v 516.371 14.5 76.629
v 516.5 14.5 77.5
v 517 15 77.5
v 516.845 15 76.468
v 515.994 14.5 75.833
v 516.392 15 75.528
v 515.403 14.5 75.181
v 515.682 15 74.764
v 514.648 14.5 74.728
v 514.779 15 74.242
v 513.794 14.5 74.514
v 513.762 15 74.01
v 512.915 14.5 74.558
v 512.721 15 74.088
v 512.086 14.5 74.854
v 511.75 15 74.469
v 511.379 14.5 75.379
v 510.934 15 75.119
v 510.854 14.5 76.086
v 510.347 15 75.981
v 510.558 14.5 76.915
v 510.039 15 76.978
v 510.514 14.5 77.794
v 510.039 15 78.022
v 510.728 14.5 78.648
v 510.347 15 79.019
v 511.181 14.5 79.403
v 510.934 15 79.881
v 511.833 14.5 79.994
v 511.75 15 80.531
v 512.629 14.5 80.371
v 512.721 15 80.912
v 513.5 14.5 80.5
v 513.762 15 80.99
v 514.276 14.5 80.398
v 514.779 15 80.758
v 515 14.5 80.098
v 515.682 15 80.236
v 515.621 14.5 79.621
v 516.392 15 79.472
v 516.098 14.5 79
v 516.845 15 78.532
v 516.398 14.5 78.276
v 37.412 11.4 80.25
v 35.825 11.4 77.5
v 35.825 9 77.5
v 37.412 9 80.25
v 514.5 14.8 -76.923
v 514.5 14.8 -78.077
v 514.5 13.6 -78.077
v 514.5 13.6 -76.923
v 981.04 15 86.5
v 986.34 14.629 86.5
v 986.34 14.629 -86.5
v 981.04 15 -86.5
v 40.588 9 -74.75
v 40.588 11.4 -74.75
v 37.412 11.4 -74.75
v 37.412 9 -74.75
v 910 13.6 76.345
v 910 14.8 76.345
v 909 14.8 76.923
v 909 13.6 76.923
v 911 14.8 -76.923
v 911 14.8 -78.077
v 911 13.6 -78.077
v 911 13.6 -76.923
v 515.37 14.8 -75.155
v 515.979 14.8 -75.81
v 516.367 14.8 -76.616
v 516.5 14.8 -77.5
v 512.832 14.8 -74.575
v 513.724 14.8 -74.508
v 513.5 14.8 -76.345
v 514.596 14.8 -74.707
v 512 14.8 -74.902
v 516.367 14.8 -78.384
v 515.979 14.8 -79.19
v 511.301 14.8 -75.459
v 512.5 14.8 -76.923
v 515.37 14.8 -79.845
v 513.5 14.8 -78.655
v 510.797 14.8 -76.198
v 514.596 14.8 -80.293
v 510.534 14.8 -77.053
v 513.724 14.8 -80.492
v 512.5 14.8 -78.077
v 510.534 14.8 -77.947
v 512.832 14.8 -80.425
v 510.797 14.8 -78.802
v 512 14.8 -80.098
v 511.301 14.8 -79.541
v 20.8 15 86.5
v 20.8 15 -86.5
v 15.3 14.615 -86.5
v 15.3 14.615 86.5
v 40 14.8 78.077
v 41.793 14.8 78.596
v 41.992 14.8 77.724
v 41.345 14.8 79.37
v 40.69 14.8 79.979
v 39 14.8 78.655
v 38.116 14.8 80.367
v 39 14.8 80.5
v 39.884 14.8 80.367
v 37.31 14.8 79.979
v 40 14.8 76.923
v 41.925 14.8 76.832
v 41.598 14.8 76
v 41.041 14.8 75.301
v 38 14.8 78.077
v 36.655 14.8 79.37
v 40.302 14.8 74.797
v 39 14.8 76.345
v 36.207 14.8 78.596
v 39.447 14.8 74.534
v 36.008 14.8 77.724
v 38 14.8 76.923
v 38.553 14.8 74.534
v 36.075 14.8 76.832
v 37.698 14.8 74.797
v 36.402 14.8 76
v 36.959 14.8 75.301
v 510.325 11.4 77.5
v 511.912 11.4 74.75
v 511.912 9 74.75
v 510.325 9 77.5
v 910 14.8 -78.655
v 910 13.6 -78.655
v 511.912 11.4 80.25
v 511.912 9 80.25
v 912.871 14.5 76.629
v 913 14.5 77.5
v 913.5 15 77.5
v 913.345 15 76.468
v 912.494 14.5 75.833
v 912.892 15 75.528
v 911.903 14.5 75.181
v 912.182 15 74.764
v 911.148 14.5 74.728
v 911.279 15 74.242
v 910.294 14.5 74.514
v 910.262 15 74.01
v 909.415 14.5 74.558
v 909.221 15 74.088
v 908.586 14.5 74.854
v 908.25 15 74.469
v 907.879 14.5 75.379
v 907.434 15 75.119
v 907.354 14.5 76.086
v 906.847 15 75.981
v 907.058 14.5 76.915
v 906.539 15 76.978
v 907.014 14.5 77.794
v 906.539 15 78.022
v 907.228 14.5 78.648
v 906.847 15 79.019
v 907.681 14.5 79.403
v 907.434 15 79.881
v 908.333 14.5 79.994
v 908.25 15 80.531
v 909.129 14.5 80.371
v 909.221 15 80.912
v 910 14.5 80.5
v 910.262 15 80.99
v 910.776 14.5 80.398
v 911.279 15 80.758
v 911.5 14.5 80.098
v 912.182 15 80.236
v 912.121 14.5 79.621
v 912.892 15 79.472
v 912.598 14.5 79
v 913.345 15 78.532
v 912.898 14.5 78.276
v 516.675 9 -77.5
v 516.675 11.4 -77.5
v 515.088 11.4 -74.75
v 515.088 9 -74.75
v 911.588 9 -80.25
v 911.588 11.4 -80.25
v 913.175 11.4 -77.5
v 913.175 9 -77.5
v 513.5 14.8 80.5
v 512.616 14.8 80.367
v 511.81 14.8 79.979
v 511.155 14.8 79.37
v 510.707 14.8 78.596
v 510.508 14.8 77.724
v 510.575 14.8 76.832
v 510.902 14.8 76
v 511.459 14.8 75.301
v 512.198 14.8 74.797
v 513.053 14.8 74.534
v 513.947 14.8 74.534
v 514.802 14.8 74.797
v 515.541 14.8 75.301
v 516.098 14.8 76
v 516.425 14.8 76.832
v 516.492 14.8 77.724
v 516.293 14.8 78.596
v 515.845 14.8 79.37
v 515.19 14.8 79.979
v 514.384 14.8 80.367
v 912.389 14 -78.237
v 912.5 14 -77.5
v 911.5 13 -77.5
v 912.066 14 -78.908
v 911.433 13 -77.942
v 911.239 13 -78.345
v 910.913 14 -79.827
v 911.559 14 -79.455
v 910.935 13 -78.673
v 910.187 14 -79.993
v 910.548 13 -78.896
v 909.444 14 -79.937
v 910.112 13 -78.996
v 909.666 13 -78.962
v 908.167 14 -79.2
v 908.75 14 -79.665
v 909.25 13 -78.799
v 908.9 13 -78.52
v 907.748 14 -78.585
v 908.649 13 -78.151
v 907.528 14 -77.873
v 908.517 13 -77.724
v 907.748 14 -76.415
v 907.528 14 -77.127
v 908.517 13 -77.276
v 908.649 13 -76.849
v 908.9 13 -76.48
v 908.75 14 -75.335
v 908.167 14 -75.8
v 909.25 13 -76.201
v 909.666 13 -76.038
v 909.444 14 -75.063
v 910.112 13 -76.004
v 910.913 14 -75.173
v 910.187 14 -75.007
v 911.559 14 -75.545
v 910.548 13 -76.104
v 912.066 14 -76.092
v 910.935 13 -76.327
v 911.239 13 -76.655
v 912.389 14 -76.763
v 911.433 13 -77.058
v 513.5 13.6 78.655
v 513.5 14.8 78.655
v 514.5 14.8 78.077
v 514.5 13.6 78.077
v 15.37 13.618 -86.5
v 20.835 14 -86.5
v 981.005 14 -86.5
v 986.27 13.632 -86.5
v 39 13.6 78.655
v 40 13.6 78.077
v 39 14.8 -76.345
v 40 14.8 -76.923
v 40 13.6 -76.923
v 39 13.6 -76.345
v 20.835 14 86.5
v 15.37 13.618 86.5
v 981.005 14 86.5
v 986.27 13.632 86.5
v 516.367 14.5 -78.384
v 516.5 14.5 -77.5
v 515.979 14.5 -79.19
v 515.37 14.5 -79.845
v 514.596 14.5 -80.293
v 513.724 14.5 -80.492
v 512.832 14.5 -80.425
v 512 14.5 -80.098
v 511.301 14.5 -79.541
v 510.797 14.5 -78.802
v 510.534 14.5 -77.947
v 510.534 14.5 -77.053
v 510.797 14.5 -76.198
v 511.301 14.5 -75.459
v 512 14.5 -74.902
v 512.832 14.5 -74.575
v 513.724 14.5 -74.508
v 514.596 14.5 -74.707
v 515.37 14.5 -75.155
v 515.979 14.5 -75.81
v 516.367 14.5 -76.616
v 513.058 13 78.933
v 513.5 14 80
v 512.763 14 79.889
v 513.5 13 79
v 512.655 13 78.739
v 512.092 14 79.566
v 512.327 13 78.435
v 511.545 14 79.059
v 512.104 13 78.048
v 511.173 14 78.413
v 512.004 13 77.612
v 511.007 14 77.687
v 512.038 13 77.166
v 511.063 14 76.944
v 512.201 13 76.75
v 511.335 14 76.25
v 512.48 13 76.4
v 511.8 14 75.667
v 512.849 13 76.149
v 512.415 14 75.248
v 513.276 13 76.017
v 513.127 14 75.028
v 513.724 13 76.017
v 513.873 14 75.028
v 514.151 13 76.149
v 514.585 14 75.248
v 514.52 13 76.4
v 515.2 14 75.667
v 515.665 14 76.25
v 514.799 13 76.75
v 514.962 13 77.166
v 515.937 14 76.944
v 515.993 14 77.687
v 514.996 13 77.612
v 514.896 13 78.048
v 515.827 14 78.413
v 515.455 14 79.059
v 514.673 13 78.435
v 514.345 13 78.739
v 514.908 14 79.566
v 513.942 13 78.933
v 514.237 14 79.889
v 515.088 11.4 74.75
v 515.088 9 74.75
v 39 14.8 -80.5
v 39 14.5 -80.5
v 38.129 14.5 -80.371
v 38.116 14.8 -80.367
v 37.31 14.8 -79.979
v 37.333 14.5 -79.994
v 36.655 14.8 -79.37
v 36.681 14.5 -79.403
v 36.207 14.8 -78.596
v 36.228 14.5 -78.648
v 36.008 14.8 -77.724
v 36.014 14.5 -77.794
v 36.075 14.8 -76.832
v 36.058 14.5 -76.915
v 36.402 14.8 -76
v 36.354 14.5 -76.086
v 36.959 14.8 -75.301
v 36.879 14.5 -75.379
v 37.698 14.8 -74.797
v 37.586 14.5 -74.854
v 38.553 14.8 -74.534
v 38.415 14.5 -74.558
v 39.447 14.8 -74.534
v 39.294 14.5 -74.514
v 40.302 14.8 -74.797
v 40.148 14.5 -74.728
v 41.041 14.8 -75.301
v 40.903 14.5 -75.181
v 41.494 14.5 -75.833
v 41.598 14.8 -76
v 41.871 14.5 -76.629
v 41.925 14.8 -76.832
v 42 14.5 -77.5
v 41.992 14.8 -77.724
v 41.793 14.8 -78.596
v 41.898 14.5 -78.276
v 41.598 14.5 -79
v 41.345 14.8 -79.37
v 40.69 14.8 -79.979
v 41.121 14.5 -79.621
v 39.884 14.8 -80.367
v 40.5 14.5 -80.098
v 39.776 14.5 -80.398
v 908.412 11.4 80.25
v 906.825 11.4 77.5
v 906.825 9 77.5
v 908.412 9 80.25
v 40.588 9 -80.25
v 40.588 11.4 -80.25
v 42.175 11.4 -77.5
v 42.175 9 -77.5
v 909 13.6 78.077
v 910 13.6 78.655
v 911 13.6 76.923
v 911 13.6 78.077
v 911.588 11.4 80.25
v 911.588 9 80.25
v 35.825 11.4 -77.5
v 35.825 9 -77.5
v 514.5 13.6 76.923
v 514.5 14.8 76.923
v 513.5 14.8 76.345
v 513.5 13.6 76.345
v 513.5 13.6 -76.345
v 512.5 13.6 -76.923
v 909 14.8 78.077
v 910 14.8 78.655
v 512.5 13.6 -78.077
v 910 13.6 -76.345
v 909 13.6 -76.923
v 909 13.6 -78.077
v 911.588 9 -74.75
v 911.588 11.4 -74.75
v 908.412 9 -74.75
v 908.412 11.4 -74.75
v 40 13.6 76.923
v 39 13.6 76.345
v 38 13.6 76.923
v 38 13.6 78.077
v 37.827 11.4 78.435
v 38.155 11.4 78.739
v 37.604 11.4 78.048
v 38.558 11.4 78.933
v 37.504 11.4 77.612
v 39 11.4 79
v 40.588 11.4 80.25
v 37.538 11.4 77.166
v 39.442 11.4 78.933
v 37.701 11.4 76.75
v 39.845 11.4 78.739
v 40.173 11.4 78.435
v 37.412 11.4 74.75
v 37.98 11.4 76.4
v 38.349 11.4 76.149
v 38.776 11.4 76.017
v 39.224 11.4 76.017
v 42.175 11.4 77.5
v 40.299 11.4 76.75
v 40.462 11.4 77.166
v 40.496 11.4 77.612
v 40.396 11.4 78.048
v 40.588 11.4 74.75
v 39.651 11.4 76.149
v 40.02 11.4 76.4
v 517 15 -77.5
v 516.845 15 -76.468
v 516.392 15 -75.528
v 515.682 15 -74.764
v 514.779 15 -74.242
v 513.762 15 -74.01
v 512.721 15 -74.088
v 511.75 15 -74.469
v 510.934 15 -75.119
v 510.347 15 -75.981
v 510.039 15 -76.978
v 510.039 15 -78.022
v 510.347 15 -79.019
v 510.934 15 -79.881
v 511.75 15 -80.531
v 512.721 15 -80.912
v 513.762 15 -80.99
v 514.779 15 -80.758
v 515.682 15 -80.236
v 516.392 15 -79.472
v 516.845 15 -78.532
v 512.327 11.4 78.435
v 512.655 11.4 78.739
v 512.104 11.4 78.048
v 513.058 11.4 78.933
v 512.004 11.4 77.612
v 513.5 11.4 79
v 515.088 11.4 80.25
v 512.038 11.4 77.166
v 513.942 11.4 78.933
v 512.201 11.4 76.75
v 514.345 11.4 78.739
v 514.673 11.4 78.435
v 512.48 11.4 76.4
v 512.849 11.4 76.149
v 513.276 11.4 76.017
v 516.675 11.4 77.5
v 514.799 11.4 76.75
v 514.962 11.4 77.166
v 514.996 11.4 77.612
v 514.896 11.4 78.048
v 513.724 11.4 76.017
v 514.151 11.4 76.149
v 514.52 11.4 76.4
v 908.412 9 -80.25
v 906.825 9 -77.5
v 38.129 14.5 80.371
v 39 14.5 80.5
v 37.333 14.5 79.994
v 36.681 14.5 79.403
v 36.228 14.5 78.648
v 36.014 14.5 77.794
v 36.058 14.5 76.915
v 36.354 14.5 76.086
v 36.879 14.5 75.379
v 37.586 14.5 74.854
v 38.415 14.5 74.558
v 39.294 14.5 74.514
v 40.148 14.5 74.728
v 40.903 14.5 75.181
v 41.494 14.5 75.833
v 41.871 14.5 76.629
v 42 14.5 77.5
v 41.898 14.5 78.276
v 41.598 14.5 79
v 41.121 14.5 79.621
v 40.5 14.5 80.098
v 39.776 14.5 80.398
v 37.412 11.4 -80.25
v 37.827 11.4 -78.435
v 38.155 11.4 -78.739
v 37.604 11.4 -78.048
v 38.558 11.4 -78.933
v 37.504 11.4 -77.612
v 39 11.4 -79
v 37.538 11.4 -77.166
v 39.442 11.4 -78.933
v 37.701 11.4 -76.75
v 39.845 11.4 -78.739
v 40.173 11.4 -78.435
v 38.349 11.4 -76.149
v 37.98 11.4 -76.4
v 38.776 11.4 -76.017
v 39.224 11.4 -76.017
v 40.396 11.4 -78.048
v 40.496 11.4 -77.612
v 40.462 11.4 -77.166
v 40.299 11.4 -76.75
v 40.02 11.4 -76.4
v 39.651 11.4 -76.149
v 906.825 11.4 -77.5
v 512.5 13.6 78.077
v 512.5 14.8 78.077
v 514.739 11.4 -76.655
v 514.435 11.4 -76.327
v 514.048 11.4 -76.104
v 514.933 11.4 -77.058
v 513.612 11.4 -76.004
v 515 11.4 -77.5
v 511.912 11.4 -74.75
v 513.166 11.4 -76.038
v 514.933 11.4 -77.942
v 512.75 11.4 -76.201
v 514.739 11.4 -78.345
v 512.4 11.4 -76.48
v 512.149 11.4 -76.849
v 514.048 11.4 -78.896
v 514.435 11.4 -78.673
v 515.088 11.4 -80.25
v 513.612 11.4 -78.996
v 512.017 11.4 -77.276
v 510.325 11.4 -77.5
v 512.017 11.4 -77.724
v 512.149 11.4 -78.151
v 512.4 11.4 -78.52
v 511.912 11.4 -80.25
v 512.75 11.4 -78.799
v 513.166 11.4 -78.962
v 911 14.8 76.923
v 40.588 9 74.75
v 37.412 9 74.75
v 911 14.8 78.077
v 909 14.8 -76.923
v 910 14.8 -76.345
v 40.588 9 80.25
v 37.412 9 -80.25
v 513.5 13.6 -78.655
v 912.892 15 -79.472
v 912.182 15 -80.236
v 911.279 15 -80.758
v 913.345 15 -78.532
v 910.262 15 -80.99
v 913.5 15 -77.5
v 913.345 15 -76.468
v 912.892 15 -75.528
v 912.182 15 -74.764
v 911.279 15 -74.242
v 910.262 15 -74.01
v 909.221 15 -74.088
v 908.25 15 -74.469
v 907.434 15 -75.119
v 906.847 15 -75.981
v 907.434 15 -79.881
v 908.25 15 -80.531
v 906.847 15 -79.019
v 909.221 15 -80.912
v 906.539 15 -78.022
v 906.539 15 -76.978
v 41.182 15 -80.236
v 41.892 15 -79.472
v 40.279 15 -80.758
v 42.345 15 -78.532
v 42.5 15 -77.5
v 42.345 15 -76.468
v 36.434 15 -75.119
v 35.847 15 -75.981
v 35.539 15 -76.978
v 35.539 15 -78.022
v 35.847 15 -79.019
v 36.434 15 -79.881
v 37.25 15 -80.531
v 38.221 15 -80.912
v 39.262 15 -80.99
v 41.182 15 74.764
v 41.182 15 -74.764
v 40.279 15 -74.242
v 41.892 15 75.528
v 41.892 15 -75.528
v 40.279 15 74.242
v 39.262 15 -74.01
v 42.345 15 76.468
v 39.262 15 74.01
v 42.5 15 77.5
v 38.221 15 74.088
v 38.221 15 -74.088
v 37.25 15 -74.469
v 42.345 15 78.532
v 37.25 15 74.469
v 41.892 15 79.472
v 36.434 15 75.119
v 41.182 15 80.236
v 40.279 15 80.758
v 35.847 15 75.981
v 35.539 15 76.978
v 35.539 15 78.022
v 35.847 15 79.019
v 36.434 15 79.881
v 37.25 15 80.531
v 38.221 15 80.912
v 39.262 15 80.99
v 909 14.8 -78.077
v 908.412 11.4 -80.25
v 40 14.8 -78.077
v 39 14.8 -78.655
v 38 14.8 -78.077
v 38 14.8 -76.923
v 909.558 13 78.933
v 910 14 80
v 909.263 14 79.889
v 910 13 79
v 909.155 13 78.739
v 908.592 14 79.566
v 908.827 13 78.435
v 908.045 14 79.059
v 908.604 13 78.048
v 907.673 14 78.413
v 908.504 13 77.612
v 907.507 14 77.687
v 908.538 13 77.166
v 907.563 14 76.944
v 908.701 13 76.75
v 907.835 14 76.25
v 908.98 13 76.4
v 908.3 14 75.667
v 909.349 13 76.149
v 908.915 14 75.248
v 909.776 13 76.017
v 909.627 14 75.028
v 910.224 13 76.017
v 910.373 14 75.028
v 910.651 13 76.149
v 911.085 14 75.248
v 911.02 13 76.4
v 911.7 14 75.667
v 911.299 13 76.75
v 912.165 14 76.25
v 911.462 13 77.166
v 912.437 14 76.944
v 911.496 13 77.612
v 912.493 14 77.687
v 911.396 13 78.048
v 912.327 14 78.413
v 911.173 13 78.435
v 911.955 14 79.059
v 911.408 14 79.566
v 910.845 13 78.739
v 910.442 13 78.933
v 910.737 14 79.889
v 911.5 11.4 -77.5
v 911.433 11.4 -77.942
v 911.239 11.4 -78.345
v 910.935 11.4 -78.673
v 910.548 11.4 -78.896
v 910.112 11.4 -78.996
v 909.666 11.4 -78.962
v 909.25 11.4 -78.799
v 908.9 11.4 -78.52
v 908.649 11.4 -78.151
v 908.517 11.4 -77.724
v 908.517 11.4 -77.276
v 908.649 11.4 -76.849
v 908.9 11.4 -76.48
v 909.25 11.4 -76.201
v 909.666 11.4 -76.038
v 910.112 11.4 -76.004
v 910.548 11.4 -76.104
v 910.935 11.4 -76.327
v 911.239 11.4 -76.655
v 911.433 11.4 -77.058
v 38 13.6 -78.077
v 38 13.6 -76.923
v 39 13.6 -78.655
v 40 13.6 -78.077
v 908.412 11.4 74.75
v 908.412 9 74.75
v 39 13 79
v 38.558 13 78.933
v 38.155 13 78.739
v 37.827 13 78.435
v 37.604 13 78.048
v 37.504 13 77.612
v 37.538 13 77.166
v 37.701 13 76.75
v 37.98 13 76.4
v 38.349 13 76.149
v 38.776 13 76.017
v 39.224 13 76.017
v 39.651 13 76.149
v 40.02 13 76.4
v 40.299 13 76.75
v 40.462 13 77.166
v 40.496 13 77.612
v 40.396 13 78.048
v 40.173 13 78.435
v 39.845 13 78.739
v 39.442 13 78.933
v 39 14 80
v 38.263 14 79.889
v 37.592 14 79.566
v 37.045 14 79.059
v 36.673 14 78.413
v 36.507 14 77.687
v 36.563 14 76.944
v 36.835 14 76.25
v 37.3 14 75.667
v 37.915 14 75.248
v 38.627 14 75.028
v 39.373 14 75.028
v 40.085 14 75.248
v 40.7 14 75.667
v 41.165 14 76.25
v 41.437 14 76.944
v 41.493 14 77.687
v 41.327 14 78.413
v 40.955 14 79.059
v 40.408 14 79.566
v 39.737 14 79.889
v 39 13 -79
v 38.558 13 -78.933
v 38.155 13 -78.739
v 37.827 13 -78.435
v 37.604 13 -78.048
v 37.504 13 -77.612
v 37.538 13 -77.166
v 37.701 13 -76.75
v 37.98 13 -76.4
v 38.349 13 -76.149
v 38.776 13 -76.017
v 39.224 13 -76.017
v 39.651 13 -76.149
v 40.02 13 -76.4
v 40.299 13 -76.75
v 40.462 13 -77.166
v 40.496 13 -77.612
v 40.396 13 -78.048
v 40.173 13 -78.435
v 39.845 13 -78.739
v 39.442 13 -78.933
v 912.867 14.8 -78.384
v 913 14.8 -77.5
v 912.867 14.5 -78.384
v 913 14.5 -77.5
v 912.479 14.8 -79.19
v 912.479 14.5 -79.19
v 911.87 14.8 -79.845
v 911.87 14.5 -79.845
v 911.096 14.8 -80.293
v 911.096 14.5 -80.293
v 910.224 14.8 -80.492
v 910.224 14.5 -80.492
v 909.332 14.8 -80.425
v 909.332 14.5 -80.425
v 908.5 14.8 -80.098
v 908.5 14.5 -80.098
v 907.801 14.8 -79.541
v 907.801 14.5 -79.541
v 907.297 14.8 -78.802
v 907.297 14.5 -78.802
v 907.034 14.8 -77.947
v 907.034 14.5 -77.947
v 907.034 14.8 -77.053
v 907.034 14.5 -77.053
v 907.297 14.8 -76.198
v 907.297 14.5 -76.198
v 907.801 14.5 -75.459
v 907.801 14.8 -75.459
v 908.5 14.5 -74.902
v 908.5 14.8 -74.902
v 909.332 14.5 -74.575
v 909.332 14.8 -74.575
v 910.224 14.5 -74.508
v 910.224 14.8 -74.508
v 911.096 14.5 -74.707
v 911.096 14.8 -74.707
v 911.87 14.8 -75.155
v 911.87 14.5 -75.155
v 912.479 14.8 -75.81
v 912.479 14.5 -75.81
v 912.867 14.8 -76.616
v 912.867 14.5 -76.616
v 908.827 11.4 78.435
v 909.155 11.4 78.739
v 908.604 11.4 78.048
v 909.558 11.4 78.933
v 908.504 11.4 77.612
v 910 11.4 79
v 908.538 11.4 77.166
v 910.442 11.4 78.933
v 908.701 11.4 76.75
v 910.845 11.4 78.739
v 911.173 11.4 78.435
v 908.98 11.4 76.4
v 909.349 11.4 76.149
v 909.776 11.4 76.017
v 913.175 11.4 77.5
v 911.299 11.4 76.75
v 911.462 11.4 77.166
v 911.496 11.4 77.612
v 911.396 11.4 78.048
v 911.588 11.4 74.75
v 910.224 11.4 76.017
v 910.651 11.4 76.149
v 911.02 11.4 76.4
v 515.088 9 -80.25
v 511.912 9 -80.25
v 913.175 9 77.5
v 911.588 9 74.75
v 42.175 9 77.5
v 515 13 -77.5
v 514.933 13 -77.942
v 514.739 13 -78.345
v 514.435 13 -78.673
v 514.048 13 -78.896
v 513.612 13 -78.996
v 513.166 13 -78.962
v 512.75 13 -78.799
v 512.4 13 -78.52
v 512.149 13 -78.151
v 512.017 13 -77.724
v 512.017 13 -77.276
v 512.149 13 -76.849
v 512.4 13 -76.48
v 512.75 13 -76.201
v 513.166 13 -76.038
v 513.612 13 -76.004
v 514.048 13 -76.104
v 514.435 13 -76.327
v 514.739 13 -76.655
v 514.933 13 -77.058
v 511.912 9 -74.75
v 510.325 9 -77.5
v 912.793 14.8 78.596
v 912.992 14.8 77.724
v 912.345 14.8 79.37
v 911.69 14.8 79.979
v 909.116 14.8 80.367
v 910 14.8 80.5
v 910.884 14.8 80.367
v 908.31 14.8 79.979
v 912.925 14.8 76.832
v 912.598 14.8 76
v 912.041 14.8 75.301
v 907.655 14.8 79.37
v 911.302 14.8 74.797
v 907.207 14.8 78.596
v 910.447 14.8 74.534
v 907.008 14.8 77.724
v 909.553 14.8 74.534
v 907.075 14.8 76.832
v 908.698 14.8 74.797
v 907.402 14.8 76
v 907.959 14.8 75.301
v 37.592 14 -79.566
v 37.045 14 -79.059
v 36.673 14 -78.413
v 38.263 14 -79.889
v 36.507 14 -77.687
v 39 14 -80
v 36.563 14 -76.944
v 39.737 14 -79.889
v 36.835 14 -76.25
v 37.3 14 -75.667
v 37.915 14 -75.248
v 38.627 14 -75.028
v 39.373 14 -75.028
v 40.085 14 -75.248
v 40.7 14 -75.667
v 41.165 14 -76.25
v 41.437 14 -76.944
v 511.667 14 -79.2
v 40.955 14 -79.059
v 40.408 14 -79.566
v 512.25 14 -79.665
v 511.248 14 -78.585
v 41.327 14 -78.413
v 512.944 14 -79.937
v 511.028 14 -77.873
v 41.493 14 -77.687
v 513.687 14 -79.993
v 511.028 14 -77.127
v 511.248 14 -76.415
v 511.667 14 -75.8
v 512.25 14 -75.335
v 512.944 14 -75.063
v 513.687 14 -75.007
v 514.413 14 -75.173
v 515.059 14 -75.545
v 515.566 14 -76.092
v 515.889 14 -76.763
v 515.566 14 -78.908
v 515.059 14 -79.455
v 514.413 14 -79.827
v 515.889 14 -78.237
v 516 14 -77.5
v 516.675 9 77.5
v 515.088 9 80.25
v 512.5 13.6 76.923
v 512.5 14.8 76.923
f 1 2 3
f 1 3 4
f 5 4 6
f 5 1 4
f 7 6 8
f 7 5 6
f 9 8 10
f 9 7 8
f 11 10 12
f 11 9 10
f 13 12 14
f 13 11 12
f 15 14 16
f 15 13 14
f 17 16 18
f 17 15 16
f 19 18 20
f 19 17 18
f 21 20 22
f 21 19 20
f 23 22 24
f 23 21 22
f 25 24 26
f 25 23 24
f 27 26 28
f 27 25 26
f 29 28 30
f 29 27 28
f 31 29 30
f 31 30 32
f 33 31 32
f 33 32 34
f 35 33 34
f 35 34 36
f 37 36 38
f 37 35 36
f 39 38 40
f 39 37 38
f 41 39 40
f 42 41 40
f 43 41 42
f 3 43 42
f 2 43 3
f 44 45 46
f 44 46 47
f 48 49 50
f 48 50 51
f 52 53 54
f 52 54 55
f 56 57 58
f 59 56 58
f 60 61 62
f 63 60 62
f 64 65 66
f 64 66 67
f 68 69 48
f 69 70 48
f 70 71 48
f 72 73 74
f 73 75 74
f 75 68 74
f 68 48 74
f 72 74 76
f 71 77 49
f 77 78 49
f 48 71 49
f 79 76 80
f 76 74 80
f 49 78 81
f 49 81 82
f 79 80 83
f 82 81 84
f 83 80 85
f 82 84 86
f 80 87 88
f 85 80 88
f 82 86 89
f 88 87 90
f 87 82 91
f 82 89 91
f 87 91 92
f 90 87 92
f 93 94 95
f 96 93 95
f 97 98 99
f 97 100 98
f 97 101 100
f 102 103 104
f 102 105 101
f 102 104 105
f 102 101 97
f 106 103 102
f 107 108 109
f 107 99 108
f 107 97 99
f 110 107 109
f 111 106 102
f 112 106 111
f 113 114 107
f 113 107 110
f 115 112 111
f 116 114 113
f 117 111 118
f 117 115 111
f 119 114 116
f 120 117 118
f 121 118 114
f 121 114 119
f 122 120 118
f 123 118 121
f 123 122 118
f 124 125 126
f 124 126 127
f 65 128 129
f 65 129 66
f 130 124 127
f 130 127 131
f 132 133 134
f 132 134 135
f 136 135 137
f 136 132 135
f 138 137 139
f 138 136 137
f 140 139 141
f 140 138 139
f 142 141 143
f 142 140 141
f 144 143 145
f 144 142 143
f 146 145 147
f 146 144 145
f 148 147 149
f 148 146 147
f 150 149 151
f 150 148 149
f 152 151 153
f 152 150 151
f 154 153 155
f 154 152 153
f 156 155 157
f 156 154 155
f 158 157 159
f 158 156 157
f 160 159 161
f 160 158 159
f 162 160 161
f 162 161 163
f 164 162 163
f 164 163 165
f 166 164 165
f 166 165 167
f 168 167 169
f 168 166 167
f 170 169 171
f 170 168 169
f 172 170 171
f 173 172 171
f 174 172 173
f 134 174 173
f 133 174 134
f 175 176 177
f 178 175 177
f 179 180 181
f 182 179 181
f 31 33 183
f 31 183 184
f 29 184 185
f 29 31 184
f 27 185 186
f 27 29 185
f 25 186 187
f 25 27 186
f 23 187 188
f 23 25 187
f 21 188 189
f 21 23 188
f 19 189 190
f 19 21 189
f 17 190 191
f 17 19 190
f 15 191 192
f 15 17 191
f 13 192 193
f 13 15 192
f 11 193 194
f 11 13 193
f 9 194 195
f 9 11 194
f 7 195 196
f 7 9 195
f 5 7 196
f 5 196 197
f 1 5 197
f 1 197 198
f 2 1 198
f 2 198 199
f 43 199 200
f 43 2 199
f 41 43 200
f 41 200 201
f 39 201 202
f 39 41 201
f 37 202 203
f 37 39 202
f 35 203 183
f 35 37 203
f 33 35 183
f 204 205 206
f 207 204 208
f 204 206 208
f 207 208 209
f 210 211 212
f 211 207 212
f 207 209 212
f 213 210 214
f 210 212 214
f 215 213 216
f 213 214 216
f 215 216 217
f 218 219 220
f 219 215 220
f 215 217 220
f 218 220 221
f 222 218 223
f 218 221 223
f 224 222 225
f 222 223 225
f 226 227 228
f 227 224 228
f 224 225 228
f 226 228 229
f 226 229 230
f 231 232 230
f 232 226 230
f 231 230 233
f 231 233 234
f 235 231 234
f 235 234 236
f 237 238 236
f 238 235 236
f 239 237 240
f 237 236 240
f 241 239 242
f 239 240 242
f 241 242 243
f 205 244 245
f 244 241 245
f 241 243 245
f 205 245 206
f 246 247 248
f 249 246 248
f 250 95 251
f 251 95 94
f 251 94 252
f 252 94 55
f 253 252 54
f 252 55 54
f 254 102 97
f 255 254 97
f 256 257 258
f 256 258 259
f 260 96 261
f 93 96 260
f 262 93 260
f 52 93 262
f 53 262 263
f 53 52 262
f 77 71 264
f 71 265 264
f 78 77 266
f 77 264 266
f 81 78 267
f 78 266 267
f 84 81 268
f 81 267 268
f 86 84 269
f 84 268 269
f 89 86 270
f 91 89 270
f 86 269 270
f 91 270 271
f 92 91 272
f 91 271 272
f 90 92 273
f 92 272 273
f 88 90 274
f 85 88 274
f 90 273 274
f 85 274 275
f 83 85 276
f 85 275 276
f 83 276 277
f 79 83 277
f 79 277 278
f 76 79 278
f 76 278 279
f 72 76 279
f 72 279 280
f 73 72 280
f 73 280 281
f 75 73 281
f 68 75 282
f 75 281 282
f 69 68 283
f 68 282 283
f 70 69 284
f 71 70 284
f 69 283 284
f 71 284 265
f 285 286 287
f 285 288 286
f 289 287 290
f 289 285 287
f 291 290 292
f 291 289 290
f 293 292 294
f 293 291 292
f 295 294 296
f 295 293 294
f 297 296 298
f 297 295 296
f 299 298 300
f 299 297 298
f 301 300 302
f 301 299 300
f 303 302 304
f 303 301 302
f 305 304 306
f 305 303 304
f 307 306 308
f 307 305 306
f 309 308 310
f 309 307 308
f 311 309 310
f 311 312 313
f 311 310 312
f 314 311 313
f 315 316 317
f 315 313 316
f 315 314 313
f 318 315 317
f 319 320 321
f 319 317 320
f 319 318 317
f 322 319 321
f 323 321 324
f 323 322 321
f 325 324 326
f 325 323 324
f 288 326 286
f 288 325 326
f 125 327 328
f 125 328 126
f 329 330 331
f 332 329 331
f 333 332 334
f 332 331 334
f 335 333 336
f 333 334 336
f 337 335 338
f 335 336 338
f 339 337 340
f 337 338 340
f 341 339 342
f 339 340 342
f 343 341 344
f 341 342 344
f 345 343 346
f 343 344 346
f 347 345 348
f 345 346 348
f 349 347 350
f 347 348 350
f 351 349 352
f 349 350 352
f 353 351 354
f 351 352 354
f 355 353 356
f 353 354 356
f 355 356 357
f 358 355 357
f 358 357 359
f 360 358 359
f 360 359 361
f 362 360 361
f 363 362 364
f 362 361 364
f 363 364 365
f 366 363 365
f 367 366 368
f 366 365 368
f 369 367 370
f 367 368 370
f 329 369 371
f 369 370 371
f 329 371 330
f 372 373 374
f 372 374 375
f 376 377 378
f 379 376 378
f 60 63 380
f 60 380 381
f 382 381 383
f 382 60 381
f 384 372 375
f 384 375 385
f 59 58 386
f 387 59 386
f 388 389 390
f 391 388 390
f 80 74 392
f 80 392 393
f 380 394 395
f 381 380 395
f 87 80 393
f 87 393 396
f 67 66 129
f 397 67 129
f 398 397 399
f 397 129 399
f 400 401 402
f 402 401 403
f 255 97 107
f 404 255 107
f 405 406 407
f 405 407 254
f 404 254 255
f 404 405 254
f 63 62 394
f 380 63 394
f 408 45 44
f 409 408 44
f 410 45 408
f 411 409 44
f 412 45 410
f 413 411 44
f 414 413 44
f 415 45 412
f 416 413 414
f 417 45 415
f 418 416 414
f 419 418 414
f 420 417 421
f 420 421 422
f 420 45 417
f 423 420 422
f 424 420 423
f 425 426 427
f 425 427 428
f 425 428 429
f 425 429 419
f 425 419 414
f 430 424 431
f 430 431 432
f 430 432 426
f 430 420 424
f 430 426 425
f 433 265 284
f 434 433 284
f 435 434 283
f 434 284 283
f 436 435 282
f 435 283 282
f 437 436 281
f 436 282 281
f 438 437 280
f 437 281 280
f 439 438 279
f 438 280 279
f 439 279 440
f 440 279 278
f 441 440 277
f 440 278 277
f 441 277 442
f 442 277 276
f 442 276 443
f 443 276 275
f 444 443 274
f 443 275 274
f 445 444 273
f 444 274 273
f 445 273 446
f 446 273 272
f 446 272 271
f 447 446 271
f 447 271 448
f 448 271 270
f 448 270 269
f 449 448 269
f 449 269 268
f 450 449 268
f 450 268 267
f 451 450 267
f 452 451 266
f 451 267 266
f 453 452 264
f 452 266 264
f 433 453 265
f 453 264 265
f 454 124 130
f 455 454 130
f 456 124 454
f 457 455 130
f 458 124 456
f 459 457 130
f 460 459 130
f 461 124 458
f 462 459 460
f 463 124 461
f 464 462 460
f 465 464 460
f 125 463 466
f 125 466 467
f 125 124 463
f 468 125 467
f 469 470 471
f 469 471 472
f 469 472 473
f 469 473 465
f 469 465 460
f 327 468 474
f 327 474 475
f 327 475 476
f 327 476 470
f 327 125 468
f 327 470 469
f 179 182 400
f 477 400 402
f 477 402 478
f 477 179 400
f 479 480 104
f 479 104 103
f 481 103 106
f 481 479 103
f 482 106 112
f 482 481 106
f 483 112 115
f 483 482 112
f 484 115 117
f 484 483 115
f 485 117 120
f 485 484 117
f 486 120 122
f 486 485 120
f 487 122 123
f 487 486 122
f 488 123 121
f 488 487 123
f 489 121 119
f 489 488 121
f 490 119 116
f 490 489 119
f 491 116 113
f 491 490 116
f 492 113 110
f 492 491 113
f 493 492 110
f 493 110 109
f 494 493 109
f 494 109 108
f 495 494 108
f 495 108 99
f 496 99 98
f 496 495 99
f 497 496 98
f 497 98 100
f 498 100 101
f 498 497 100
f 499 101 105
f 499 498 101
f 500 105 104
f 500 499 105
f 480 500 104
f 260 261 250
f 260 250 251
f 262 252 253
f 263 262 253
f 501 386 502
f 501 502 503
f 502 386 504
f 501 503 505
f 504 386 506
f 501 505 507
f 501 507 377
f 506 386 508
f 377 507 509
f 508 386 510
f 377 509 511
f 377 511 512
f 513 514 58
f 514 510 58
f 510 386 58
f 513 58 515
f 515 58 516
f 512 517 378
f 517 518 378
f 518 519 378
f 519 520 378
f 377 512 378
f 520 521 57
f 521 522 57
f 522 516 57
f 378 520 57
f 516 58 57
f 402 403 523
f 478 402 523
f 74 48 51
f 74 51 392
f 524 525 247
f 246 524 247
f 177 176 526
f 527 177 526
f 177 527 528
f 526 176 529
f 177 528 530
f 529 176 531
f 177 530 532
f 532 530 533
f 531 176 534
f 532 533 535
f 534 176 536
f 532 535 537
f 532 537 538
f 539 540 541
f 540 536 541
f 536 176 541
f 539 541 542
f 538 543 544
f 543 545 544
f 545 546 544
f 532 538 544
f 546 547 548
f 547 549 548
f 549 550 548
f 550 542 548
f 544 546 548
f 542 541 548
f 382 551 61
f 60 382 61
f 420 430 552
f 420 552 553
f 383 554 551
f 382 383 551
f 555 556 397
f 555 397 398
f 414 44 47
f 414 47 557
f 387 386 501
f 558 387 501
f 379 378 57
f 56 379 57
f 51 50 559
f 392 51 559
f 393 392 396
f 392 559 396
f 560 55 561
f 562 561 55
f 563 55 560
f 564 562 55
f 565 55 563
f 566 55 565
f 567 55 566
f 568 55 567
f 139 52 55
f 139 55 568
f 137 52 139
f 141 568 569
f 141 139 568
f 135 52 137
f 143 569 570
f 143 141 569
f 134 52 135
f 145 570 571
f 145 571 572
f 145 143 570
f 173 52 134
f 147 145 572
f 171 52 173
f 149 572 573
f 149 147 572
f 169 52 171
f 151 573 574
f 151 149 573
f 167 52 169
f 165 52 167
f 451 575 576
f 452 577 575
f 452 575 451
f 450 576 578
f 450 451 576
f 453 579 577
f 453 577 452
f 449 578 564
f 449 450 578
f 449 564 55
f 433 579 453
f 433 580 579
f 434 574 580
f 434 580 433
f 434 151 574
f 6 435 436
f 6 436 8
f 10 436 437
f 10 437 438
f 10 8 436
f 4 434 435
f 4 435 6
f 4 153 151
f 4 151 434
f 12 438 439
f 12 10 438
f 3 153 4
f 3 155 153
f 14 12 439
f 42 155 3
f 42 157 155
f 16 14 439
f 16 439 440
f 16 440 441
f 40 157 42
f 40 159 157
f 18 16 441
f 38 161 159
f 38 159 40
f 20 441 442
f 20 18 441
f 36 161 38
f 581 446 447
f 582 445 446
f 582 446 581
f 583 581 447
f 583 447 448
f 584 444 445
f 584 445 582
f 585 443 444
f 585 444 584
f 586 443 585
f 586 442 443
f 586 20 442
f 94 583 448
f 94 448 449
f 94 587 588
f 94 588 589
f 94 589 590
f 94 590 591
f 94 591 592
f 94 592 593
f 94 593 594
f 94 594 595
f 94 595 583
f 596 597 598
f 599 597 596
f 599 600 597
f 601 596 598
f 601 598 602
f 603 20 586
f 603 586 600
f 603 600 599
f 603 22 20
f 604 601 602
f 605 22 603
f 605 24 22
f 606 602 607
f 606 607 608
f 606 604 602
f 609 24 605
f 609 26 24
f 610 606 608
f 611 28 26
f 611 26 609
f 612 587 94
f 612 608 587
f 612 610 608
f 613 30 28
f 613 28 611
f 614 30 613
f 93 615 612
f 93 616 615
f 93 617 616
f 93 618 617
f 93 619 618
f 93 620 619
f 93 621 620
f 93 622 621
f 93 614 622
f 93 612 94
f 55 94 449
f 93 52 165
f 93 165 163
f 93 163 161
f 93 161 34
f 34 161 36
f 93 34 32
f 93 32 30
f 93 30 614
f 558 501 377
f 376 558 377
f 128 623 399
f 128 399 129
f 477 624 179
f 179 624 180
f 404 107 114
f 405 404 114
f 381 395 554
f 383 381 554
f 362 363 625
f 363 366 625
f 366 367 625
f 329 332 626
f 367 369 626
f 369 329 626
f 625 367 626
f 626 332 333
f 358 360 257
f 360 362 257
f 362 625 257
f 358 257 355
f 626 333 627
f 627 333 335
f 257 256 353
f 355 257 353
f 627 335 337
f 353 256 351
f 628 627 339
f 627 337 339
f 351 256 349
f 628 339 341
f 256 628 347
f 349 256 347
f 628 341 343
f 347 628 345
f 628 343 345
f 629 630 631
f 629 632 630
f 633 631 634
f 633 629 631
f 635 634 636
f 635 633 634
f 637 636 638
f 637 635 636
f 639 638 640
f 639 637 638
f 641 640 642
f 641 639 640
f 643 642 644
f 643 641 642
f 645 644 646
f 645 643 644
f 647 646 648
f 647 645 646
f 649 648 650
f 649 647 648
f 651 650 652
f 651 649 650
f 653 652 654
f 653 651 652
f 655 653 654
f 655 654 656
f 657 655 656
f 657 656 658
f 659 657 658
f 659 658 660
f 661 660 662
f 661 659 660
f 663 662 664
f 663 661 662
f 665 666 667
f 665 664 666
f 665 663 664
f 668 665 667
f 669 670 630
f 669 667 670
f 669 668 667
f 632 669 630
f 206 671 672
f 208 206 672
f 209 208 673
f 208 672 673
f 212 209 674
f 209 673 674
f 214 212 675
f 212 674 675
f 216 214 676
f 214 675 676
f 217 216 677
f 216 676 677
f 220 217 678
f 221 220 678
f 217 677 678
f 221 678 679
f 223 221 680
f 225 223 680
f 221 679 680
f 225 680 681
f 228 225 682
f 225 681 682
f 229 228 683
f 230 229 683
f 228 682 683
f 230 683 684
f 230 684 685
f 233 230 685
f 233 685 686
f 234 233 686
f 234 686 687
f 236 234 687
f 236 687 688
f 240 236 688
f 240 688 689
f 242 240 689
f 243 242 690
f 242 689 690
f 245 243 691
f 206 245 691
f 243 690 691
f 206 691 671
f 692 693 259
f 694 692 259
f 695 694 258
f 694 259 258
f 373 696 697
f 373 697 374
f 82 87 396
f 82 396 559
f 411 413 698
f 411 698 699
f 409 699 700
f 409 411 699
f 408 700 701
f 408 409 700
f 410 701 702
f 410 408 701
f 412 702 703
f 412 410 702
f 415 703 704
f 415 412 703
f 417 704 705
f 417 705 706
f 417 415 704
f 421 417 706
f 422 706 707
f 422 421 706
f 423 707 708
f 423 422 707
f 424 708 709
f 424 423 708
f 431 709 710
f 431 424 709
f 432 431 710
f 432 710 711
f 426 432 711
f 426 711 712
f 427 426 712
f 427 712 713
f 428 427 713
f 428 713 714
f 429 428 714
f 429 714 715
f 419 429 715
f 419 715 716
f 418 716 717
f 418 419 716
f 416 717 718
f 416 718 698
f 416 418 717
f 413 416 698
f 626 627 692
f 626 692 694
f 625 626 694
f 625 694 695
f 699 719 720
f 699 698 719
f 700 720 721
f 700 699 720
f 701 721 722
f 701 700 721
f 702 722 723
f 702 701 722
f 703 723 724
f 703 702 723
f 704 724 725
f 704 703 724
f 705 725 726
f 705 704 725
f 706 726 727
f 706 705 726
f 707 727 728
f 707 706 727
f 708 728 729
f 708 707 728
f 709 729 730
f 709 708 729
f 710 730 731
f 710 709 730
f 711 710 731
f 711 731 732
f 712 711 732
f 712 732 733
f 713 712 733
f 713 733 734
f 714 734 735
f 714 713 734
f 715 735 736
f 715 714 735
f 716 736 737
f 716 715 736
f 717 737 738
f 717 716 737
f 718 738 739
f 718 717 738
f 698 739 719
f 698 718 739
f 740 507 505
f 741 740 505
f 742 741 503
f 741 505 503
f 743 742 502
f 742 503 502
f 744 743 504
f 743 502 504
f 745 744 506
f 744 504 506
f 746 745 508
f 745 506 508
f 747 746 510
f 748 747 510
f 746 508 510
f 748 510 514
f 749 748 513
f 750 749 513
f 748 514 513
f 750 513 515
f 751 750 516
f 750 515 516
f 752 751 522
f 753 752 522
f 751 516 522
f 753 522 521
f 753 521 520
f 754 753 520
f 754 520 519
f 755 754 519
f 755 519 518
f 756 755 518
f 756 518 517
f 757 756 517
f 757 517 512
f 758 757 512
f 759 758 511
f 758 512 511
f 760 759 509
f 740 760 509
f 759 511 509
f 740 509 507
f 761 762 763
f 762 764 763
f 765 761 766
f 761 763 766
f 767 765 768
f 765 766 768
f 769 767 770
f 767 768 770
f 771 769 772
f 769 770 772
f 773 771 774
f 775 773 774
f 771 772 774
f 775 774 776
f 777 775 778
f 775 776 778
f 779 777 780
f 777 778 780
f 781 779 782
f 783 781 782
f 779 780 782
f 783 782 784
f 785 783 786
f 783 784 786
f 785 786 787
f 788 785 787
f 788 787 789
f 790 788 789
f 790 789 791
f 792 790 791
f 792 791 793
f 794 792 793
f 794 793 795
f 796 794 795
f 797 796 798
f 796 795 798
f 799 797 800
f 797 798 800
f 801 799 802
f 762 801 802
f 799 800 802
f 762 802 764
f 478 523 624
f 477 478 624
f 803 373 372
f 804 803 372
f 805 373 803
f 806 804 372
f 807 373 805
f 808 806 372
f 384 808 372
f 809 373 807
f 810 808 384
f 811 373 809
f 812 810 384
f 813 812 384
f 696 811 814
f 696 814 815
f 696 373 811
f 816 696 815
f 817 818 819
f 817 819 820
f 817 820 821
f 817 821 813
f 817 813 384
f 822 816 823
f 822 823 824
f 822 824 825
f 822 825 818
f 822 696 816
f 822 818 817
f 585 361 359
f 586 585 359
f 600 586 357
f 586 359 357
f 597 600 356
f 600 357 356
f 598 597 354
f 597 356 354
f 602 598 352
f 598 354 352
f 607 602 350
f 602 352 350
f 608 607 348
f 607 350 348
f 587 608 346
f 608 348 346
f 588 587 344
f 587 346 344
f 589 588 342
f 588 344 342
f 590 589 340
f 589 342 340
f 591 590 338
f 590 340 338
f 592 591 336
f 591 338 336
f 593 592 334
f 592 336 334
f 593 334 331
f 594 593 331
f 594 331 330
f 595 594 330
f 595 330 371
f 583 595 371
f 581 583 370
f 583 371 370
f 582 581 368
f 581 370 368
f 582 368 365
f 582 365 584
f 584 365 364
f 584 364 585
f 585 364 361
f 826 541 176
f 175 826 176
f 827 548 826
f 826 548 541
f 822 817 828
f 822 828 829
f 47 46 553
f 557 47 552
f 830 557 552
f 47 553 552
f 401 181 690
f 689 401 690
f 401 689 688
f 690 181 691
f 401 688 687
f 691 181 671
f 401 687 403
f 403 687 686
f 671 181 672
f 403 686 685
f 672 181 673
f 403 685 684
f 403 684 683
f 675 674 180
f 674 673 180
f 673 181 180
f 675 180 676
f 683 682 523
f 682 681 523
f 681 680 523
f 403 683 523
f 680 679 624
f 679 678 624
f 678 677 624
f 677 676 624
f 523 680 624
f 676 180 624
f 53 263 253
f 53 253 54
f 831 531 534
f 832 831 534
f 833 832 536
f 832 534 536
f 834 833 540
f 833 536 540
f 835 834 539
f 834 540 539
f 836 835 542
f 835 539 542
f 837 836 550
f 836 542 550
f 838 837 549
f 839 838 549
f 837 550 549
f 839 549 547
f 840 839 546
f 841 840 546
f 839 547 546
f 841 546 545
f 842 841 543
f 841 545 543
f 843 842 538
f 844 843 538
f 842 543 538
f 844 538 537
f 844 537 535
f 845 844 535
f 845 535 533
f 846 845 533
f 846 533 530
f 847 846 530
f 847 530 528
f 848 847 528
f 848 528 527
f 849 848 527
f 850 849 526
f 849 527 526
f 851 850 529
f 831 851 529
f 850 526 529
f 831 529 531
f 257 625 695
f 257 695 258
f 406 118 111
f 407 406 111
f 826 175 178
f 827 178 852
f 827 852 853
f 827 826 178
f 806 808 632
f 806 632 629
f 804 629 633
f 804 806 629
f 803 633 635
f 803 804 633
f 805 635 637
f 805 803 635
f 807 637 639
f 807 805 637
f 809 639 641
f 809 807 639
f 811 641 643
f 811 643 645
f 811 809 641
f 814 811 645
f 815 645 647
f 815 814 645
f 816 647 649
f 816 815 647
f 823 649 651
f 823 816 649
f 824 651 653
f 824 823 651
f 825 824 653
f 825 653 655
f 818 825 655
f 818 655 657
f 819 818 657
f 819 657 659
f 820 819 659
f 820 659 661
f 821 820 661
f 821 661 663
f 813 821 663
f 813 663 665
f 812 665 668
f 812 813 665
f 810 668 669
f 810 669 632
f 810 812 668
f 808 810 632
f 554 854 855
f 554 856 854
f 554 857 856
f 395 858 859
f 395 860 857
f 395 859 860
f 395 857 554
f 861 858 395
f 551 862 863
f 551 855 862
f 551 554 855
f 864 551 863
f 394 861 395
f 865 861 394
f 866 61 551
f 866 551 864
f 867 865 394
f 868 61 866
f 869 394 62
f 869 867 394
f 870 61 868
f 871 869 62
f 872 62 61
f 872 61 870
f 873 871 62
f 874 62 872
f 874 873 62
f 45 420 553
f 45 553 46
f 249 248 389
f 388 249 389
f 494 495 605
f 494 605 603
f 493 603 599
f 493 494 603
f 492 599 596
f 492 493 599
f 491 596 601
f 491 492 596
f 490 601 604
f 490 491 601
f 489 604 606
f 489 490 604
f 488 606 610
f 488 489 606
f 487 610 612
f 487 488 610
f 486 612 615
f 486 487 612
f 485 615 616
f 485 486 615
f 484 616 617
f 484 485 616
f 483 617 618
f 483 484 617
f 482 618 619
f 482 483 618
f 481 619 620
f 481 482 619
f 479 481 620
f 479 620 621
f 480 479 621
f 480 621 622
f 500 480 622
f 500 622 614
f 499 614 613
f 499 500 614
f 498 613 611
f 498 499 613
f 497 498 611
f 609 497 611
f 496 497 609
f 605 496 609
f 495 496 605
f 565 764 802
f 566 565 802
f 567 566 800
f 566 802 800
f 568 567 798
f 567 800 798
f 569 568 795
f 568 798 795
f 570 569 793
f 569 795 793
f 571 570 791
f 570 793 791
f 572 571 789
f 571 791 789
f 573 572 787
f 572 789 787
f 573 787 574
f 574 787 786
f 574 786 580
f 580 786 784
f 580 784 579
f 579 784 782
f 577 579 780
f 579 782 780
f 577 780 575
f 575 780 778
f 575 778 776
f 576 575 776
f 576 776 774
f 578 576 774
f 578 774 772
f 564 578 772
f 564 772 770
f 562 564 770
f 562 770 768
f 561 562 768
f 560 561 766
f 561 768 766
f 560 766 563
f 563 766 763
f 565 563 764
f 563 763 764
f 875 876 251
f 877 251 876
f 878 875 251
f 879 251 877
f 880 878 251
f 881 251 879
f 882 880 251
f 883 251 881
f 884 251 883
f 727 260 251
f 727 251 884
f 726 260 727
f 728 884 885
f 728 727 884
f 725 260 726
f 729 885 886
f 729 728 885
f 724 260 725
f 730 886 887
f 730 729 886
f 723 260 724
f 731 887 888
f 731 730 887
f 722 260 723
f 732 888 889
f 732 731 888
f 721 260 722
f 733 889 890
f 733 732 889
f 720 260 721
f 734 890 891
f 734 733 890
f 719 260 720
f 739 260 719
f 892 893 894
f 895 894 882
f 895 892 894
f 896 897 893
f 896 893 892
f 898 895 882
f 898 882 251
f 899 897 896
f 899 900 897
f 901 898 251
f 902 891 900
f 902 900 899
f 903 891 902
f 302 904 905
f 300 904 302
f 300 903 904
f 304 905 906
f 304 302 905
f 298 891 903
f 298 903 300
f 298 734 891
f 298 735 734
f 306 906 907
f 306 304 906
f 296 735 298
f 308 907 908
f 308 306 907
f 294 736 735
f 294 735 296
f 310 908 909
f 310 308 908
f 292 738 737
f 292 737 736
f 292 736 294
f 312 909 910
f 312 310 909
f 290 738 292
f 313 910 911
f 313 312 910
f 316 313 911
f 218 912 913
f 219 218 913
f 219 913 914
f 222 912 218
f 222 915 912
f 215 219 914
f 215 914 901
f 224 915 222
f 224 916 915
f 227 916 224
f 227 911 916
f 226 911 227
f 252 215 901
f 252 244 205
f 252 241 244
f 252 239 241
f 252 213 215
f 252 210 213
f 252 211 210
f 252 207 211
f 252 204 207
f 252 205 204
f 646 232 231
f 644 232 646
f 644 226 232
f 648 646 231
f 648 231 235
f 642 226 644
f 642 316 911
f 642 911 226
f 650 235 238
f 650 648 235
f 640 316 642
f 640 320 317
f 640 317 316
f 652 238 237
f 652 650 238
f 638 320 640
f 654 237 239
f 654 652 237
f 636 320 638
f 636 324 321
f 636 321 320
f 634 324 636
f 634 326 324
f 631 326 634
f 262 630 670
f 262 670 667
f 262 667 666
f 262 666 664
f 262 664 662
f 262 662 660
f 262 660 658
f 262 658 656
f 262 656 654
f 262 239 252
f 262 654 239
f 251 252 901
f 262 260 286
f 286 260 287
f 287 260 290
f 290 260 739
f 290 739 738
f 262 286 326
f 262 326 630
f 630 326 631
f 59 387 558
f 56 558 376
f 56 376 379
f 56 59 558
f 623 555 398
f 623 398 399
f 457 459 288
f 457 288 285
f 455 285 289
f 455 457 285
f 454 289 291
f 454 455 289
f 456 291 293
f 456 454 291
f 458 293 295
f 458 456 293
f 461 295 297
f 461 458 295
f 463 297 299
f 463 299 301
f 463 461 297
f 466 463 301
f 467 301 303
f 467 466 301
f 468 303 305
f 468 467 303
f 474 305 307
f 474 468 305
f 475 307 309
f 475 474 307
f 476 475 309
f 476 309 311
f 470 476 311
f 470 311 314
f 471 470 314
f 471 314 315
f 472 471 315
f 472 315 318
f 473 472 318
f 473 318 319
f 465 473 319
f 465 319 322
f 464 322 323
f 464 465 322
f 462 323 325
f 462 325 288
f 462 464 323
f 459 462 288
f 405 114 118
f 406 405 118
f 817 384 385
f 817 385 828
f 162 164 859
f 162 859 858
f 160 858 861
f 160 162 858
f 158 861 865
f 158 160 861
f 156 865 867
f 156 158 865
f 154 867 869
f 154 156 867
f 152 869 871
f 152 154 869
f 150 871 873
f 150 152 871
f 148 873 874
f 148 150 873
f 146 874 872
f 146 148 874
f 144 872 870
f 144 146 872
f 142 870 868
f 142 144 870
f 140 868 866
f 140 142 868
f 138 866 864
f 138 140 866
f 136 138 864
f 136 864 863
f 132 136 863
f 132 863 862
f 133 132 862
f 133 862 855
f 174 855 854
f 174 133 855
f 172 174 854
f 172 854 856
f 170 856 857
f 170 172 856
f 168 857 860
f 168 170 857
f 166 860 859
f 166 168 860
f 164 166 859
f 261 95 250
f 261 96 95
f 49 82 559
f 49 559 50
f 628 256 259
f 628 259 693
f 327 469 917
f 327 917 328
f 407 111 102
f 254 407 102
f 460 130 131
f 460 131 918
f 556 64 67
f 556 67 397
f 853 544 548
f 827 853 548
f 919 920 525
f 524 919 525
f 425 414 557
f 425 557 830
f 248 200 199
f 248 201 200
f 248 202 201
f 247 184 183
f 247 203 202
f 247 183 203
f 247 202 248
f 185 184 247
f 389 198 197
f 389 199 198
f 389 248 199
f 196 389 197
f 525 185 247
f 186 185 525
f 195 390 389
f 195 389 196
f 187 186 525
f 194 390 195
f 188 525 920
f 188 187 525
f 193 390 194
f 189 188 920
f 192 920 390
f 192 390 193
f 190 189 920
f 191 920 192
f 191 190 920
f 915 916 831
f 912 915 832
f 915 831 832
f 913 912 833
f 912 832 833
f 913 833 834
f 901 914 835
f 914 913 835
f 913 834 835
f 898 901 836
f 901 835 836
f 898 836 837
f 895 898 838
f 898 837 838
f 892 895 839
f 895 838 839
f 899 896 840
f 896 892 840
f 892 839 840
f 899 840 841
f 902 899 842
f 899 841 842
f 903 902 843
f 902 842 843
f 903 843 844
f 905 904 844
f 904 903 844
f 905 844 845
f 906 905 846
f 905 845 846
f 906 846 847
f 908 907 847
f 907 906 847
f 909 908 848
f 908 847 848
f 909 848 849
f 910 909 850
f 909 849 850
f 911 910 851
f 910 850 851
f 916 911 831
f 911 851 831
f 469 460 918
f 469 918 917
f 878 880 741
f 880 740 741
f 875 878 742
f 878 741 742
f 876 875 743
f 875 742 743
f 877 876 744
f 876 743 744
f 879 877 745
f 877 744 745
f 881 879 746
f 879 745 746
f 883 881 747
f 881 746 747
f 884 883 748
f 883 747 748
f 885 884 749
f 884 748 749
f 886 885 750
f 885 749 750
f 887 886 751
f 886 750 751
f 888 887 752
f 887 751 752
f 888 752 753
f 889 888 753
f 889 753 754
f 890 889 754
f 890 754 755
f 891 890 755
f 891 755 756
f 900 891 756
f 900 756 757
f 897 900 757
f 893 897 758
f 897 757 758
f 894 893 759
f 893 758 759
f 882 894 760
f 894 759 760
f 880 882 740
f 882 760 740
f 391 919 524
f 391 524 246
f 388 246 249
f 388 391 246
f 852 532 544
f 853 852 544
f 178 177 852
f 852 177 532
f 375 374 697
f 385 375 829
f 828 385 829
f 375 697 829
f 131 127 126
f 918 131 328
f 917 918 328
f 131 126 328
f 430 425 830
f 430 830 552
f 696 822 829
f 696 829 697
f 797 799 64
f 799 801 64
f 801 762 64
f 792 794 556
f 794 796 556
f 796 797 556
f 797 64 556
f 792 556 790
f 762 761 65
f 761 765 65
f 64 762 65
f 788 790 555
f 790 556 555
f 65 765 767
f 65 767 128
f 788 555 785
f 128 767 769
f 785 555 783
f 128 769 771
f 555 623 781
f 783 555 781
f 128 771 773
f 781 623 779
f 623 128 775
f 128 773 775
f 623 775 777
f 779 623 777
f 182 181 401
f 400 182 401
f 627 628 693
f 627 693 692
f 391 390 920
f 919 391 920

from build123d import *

# Parameters (mm, degrees)
BOSS_EXTRUDE1_DEPTH    = 86.5
CUT_EXTRUDE1_DEPTH     = 1.2
BOSS_EXTRUDE2_DEPTH    = 2.4
LPATTERN1_COUNT        = 2
LPATTERN1_PITCH        = 871
LPATTERN1_COPY_3_DEPTH = 1.2
LPATTERN1_COPY_4_DEPTH = 2.4
LPATTERN2_COUNT        = 2
LPATTERN2_PITCH        = 474.5
LPATTERN2_COPY_3_DEPTH = 1.2
LPATTERN2_COPY_4_DEPTH = 2.4


with BuildPart() as part:
    # Sketch1 → Boss-Extrude1 (new, symmetric)
    with BuildSketch(Plane.XY):
        Polygon((15.3, 14.615402534), (15.369756474, 13.617838484), (20.834920769, 14), (981.005079231, 14), (986.270243526, 13.631823846), (986.34, 14.629387897), (981.04, 15), (20.8, 15), align=None)
    extrude(amount=BOSS_EXTRUDE1_DEPTH, both=True)

    # Sketch3 → Cut-Revolve1 (revolve, cut)
    with BuildSketch(Plane.XY.offset(77.5)):
        Polygon((39, 15), (42.5, 15), (41.5, 14), (39, 14), align=None)
    cut_revolve1 = revolve(axis=Axis((39, 14, 77.5), (0, 1, 0)), mode=Mode.SUBTRACT)

    # Sketch4 → Revolve1 (revolve)
    with BuildSketch(Plane.XY.offset(77.5)):
        Polygon((39, 14.8), (42, 14.8), (42, 14.5), (40.5, 13), (40.5, 9.3), (39, 9.3), align=None)
    revolve1 = revolve(axis=Axis((39, 15, 77.5), (0, -1, 0)))

    # Sketch5 → Cut-Extrude1 (cut)
    with BuildSketch(Plane(origin=(0, 14.8, 0), x_dir=(1, 0, 0), z_dir=(0, 1, 0))):
        Polygon((39, -76.345299462), (38, -76.922649731), (38, -78.077350269), (39, -78.654700538), (40, -78.077350269), (40, -76.922649731), align=None)
    cut_extrude1 = extrude(amount=-CUT_EXTRUDE1_DEPTH, mode=Mode.SUBTRACT)

    # Sketch6 → Boss-Extrude2 (add)
    with BuildSketch(Plane(origin=(0, 11.4, 0), x_dir=(1, 0, 0), z_dir=(0, 1, 0))):
        Polygon((35.824573519, -77.5), (37.41228676, -80.25), (40.58771324, -80.25), (42.175426481, -77.5), (40.58771324, -74.75), (37.41228676, -74.75), align=None)
    boss_extrude2 = extrude(amount=-BOSS_EXTRUDE2_DEPTH)

    # Mirror1: Cut-Revolve1, Revolve1, Cut-Extrude1, Boss-Extrude2 across plane
    add(cut_revolve1.mirror(Plane.XY), mode=Mode.SUBTRACT)
    add(revolve1.mirror(Plane.XY))
    add(cut_extrude1.mirror(Plane.XY), mode=Mode.SUBTRACT)
    add(boss_extrude2.mirror(Plane.XY))

    # LPattern1: Cut-Revolve1, Revolve1, Cut-Extrude1, Boss-Extrude2 ×2
    with Locations(*[(i * LPATTERN1_PITCH, 0, 0) for i in range(1, LPATTERN1_COUNT)]):
        add(cut_revolve1, mode=Mode.SUBTRACT)
        add(revolve1)
        add(cut_extrude1, mode=Mode.SUBTRACT)
        add(boss_extrude2)

    # LPattern1 copy 1 sketch → LPattern1 copy 1 (revolve, cut)
    with BuildSketch(Plane(origin=(871, 0, -77.5), x_dir=(1, 0, 0), z_dir=(0, 0, -1))):
        Polygon((39, -15), (42.5, -15), (41.5, -14), (39, -14), align=None)
    revolve(axis=Axis((910, 14, -77.5), (0, -1, 0)), mode=Mode.SUBTRACT)

    # LPattern1 copy 2 sketch → LPattern1 copy 2 (revolve)
    with BuildSketch(Plane(origin=(871, 0, -77.5), x_dir=(1, 0, 0), z_dir=(0, 0, -1))):
        Polygon((39, -14.8), (42, -14.8), (42, -14.5), (40.5, -13), (40.5, -9.3), (39, -9.3), align=None)
    revolve(axis=Axis((910, 15, -77.5), (0, 1, 0)))

    # LPattern1 copy 3 sketch → LPattern1 copy 3 (cut)
    with BuildSketch(Plane(origin=(871, 14.8, 0), x_dir=(1, 0, 0), z_dir=(0, 1, 0))):
        Polygon((39, 76.345299462), (38, 76.922649731), (38, 78.077350269), (39, 78.654700538), (40, 78.077350269), (40, 76.922649731), align=None)
    extrude(amount=-LPATTERN1_COPY_3_DEPTH, mode=Mode.SUBTRACT)

    # LPattern1 copy 4 sketch → LPattern1 copy 4 (add)
    with BuildSketch(Plane(origin=(871, 11.4, 0), x_dir=(1, 0, 0), z_dir=(0, 1, 0))):
        Polygon((35.824573519, 77.5), (37.41228676, 80.25), (40.58771324, 80.25), (42.175426481, 77.5), (40.58771324, 74.75), (37.41228676, 74.75), align=None)
    extrude(amount=-LPATTERN1_COPY_4_DEPTH)

    # LPattern2: Cut-Revolve1, Revolve1, Cut-Extrude1, Boss-Extrude2 ×2
    with Locations(*[(i * LPATTERN2_PITCH, 0, 0) for i in range(1, LPATTERN2_COUNT)]):
        add(cut_revolve1, mode=Mode.SUBTRACT)
        add(revolve1)
        add(cut_extrude1, mode=Mode.SUBTRACT)
        add(boss_extrude2)

    # LPattern2 copy 1 sketch → LPattern2 copy 1 (revolve, cut)
    with BuildSketch(Plane(origin=(474.5, 0, -77.5), x_dir=(1, 0, 0), z_dir=(0, 0, -1))):
        Polygon((39, -15), (42.5, -15), (41.5, -14), (39, -14), align=None)
    revolve(axis=Axis((513.5, 14, -77.5), (0, -1, 0)), mode=Mode.SUBTRACT)

    # LPattern2 copy 2 sketch → LPattern2 copy 2 (revolve)
    with BuildSketch(Plane(origin=(474.5, 0, -77.5), x_dir=(1, 0, 0), z_dir=(0, 0, -1))):
        Polygon((39, -14.8), (42, -14.8), (42, -14.5), (40.5, -13), (40.5, -9.3), (39, -9.3), align=None)
    revolve(axis=Axis((513.5, 15, -77.5), (0, 1, 0)))

    # LPattern2 copy 3 sketch → LPattern2 copy 3 (cut)
    with BuildSketch(Plane(origin=(474.5, 14.8, 0), x_dir=(1, 0, 0), z_dir=(0, 1, 0))):
        Polygon((39, 76.345299462), (38, 76.922649731), (38, 78.077350269), (39, 78.654700538), (40, 78.077350269), (40, 76.922649731), align=None)
    extrude(amount=-LPATTERN2_COPY_3_DEPTH, mode=Mode.SUBTRACT)

    # LPattern2 copy 4 sketch → LPattern2 copy 4 (add)
    with BuildSketch(Plane(origin=(474.5, 11.4, 0), x_dir=(1, 0, 0), z_dir=(0, 1, 0))):
        Polygon((35.824573519, 77.5), (37.41228676, 80.25), (40.58771324, 80.25), (42.175426481, 77.5), (40.58771324, 74.75), (37.41228676, 74.75), align=None)
    extrude(amount=-LPATTERN2_COPY_4_DEPTH)


solid = part.part
